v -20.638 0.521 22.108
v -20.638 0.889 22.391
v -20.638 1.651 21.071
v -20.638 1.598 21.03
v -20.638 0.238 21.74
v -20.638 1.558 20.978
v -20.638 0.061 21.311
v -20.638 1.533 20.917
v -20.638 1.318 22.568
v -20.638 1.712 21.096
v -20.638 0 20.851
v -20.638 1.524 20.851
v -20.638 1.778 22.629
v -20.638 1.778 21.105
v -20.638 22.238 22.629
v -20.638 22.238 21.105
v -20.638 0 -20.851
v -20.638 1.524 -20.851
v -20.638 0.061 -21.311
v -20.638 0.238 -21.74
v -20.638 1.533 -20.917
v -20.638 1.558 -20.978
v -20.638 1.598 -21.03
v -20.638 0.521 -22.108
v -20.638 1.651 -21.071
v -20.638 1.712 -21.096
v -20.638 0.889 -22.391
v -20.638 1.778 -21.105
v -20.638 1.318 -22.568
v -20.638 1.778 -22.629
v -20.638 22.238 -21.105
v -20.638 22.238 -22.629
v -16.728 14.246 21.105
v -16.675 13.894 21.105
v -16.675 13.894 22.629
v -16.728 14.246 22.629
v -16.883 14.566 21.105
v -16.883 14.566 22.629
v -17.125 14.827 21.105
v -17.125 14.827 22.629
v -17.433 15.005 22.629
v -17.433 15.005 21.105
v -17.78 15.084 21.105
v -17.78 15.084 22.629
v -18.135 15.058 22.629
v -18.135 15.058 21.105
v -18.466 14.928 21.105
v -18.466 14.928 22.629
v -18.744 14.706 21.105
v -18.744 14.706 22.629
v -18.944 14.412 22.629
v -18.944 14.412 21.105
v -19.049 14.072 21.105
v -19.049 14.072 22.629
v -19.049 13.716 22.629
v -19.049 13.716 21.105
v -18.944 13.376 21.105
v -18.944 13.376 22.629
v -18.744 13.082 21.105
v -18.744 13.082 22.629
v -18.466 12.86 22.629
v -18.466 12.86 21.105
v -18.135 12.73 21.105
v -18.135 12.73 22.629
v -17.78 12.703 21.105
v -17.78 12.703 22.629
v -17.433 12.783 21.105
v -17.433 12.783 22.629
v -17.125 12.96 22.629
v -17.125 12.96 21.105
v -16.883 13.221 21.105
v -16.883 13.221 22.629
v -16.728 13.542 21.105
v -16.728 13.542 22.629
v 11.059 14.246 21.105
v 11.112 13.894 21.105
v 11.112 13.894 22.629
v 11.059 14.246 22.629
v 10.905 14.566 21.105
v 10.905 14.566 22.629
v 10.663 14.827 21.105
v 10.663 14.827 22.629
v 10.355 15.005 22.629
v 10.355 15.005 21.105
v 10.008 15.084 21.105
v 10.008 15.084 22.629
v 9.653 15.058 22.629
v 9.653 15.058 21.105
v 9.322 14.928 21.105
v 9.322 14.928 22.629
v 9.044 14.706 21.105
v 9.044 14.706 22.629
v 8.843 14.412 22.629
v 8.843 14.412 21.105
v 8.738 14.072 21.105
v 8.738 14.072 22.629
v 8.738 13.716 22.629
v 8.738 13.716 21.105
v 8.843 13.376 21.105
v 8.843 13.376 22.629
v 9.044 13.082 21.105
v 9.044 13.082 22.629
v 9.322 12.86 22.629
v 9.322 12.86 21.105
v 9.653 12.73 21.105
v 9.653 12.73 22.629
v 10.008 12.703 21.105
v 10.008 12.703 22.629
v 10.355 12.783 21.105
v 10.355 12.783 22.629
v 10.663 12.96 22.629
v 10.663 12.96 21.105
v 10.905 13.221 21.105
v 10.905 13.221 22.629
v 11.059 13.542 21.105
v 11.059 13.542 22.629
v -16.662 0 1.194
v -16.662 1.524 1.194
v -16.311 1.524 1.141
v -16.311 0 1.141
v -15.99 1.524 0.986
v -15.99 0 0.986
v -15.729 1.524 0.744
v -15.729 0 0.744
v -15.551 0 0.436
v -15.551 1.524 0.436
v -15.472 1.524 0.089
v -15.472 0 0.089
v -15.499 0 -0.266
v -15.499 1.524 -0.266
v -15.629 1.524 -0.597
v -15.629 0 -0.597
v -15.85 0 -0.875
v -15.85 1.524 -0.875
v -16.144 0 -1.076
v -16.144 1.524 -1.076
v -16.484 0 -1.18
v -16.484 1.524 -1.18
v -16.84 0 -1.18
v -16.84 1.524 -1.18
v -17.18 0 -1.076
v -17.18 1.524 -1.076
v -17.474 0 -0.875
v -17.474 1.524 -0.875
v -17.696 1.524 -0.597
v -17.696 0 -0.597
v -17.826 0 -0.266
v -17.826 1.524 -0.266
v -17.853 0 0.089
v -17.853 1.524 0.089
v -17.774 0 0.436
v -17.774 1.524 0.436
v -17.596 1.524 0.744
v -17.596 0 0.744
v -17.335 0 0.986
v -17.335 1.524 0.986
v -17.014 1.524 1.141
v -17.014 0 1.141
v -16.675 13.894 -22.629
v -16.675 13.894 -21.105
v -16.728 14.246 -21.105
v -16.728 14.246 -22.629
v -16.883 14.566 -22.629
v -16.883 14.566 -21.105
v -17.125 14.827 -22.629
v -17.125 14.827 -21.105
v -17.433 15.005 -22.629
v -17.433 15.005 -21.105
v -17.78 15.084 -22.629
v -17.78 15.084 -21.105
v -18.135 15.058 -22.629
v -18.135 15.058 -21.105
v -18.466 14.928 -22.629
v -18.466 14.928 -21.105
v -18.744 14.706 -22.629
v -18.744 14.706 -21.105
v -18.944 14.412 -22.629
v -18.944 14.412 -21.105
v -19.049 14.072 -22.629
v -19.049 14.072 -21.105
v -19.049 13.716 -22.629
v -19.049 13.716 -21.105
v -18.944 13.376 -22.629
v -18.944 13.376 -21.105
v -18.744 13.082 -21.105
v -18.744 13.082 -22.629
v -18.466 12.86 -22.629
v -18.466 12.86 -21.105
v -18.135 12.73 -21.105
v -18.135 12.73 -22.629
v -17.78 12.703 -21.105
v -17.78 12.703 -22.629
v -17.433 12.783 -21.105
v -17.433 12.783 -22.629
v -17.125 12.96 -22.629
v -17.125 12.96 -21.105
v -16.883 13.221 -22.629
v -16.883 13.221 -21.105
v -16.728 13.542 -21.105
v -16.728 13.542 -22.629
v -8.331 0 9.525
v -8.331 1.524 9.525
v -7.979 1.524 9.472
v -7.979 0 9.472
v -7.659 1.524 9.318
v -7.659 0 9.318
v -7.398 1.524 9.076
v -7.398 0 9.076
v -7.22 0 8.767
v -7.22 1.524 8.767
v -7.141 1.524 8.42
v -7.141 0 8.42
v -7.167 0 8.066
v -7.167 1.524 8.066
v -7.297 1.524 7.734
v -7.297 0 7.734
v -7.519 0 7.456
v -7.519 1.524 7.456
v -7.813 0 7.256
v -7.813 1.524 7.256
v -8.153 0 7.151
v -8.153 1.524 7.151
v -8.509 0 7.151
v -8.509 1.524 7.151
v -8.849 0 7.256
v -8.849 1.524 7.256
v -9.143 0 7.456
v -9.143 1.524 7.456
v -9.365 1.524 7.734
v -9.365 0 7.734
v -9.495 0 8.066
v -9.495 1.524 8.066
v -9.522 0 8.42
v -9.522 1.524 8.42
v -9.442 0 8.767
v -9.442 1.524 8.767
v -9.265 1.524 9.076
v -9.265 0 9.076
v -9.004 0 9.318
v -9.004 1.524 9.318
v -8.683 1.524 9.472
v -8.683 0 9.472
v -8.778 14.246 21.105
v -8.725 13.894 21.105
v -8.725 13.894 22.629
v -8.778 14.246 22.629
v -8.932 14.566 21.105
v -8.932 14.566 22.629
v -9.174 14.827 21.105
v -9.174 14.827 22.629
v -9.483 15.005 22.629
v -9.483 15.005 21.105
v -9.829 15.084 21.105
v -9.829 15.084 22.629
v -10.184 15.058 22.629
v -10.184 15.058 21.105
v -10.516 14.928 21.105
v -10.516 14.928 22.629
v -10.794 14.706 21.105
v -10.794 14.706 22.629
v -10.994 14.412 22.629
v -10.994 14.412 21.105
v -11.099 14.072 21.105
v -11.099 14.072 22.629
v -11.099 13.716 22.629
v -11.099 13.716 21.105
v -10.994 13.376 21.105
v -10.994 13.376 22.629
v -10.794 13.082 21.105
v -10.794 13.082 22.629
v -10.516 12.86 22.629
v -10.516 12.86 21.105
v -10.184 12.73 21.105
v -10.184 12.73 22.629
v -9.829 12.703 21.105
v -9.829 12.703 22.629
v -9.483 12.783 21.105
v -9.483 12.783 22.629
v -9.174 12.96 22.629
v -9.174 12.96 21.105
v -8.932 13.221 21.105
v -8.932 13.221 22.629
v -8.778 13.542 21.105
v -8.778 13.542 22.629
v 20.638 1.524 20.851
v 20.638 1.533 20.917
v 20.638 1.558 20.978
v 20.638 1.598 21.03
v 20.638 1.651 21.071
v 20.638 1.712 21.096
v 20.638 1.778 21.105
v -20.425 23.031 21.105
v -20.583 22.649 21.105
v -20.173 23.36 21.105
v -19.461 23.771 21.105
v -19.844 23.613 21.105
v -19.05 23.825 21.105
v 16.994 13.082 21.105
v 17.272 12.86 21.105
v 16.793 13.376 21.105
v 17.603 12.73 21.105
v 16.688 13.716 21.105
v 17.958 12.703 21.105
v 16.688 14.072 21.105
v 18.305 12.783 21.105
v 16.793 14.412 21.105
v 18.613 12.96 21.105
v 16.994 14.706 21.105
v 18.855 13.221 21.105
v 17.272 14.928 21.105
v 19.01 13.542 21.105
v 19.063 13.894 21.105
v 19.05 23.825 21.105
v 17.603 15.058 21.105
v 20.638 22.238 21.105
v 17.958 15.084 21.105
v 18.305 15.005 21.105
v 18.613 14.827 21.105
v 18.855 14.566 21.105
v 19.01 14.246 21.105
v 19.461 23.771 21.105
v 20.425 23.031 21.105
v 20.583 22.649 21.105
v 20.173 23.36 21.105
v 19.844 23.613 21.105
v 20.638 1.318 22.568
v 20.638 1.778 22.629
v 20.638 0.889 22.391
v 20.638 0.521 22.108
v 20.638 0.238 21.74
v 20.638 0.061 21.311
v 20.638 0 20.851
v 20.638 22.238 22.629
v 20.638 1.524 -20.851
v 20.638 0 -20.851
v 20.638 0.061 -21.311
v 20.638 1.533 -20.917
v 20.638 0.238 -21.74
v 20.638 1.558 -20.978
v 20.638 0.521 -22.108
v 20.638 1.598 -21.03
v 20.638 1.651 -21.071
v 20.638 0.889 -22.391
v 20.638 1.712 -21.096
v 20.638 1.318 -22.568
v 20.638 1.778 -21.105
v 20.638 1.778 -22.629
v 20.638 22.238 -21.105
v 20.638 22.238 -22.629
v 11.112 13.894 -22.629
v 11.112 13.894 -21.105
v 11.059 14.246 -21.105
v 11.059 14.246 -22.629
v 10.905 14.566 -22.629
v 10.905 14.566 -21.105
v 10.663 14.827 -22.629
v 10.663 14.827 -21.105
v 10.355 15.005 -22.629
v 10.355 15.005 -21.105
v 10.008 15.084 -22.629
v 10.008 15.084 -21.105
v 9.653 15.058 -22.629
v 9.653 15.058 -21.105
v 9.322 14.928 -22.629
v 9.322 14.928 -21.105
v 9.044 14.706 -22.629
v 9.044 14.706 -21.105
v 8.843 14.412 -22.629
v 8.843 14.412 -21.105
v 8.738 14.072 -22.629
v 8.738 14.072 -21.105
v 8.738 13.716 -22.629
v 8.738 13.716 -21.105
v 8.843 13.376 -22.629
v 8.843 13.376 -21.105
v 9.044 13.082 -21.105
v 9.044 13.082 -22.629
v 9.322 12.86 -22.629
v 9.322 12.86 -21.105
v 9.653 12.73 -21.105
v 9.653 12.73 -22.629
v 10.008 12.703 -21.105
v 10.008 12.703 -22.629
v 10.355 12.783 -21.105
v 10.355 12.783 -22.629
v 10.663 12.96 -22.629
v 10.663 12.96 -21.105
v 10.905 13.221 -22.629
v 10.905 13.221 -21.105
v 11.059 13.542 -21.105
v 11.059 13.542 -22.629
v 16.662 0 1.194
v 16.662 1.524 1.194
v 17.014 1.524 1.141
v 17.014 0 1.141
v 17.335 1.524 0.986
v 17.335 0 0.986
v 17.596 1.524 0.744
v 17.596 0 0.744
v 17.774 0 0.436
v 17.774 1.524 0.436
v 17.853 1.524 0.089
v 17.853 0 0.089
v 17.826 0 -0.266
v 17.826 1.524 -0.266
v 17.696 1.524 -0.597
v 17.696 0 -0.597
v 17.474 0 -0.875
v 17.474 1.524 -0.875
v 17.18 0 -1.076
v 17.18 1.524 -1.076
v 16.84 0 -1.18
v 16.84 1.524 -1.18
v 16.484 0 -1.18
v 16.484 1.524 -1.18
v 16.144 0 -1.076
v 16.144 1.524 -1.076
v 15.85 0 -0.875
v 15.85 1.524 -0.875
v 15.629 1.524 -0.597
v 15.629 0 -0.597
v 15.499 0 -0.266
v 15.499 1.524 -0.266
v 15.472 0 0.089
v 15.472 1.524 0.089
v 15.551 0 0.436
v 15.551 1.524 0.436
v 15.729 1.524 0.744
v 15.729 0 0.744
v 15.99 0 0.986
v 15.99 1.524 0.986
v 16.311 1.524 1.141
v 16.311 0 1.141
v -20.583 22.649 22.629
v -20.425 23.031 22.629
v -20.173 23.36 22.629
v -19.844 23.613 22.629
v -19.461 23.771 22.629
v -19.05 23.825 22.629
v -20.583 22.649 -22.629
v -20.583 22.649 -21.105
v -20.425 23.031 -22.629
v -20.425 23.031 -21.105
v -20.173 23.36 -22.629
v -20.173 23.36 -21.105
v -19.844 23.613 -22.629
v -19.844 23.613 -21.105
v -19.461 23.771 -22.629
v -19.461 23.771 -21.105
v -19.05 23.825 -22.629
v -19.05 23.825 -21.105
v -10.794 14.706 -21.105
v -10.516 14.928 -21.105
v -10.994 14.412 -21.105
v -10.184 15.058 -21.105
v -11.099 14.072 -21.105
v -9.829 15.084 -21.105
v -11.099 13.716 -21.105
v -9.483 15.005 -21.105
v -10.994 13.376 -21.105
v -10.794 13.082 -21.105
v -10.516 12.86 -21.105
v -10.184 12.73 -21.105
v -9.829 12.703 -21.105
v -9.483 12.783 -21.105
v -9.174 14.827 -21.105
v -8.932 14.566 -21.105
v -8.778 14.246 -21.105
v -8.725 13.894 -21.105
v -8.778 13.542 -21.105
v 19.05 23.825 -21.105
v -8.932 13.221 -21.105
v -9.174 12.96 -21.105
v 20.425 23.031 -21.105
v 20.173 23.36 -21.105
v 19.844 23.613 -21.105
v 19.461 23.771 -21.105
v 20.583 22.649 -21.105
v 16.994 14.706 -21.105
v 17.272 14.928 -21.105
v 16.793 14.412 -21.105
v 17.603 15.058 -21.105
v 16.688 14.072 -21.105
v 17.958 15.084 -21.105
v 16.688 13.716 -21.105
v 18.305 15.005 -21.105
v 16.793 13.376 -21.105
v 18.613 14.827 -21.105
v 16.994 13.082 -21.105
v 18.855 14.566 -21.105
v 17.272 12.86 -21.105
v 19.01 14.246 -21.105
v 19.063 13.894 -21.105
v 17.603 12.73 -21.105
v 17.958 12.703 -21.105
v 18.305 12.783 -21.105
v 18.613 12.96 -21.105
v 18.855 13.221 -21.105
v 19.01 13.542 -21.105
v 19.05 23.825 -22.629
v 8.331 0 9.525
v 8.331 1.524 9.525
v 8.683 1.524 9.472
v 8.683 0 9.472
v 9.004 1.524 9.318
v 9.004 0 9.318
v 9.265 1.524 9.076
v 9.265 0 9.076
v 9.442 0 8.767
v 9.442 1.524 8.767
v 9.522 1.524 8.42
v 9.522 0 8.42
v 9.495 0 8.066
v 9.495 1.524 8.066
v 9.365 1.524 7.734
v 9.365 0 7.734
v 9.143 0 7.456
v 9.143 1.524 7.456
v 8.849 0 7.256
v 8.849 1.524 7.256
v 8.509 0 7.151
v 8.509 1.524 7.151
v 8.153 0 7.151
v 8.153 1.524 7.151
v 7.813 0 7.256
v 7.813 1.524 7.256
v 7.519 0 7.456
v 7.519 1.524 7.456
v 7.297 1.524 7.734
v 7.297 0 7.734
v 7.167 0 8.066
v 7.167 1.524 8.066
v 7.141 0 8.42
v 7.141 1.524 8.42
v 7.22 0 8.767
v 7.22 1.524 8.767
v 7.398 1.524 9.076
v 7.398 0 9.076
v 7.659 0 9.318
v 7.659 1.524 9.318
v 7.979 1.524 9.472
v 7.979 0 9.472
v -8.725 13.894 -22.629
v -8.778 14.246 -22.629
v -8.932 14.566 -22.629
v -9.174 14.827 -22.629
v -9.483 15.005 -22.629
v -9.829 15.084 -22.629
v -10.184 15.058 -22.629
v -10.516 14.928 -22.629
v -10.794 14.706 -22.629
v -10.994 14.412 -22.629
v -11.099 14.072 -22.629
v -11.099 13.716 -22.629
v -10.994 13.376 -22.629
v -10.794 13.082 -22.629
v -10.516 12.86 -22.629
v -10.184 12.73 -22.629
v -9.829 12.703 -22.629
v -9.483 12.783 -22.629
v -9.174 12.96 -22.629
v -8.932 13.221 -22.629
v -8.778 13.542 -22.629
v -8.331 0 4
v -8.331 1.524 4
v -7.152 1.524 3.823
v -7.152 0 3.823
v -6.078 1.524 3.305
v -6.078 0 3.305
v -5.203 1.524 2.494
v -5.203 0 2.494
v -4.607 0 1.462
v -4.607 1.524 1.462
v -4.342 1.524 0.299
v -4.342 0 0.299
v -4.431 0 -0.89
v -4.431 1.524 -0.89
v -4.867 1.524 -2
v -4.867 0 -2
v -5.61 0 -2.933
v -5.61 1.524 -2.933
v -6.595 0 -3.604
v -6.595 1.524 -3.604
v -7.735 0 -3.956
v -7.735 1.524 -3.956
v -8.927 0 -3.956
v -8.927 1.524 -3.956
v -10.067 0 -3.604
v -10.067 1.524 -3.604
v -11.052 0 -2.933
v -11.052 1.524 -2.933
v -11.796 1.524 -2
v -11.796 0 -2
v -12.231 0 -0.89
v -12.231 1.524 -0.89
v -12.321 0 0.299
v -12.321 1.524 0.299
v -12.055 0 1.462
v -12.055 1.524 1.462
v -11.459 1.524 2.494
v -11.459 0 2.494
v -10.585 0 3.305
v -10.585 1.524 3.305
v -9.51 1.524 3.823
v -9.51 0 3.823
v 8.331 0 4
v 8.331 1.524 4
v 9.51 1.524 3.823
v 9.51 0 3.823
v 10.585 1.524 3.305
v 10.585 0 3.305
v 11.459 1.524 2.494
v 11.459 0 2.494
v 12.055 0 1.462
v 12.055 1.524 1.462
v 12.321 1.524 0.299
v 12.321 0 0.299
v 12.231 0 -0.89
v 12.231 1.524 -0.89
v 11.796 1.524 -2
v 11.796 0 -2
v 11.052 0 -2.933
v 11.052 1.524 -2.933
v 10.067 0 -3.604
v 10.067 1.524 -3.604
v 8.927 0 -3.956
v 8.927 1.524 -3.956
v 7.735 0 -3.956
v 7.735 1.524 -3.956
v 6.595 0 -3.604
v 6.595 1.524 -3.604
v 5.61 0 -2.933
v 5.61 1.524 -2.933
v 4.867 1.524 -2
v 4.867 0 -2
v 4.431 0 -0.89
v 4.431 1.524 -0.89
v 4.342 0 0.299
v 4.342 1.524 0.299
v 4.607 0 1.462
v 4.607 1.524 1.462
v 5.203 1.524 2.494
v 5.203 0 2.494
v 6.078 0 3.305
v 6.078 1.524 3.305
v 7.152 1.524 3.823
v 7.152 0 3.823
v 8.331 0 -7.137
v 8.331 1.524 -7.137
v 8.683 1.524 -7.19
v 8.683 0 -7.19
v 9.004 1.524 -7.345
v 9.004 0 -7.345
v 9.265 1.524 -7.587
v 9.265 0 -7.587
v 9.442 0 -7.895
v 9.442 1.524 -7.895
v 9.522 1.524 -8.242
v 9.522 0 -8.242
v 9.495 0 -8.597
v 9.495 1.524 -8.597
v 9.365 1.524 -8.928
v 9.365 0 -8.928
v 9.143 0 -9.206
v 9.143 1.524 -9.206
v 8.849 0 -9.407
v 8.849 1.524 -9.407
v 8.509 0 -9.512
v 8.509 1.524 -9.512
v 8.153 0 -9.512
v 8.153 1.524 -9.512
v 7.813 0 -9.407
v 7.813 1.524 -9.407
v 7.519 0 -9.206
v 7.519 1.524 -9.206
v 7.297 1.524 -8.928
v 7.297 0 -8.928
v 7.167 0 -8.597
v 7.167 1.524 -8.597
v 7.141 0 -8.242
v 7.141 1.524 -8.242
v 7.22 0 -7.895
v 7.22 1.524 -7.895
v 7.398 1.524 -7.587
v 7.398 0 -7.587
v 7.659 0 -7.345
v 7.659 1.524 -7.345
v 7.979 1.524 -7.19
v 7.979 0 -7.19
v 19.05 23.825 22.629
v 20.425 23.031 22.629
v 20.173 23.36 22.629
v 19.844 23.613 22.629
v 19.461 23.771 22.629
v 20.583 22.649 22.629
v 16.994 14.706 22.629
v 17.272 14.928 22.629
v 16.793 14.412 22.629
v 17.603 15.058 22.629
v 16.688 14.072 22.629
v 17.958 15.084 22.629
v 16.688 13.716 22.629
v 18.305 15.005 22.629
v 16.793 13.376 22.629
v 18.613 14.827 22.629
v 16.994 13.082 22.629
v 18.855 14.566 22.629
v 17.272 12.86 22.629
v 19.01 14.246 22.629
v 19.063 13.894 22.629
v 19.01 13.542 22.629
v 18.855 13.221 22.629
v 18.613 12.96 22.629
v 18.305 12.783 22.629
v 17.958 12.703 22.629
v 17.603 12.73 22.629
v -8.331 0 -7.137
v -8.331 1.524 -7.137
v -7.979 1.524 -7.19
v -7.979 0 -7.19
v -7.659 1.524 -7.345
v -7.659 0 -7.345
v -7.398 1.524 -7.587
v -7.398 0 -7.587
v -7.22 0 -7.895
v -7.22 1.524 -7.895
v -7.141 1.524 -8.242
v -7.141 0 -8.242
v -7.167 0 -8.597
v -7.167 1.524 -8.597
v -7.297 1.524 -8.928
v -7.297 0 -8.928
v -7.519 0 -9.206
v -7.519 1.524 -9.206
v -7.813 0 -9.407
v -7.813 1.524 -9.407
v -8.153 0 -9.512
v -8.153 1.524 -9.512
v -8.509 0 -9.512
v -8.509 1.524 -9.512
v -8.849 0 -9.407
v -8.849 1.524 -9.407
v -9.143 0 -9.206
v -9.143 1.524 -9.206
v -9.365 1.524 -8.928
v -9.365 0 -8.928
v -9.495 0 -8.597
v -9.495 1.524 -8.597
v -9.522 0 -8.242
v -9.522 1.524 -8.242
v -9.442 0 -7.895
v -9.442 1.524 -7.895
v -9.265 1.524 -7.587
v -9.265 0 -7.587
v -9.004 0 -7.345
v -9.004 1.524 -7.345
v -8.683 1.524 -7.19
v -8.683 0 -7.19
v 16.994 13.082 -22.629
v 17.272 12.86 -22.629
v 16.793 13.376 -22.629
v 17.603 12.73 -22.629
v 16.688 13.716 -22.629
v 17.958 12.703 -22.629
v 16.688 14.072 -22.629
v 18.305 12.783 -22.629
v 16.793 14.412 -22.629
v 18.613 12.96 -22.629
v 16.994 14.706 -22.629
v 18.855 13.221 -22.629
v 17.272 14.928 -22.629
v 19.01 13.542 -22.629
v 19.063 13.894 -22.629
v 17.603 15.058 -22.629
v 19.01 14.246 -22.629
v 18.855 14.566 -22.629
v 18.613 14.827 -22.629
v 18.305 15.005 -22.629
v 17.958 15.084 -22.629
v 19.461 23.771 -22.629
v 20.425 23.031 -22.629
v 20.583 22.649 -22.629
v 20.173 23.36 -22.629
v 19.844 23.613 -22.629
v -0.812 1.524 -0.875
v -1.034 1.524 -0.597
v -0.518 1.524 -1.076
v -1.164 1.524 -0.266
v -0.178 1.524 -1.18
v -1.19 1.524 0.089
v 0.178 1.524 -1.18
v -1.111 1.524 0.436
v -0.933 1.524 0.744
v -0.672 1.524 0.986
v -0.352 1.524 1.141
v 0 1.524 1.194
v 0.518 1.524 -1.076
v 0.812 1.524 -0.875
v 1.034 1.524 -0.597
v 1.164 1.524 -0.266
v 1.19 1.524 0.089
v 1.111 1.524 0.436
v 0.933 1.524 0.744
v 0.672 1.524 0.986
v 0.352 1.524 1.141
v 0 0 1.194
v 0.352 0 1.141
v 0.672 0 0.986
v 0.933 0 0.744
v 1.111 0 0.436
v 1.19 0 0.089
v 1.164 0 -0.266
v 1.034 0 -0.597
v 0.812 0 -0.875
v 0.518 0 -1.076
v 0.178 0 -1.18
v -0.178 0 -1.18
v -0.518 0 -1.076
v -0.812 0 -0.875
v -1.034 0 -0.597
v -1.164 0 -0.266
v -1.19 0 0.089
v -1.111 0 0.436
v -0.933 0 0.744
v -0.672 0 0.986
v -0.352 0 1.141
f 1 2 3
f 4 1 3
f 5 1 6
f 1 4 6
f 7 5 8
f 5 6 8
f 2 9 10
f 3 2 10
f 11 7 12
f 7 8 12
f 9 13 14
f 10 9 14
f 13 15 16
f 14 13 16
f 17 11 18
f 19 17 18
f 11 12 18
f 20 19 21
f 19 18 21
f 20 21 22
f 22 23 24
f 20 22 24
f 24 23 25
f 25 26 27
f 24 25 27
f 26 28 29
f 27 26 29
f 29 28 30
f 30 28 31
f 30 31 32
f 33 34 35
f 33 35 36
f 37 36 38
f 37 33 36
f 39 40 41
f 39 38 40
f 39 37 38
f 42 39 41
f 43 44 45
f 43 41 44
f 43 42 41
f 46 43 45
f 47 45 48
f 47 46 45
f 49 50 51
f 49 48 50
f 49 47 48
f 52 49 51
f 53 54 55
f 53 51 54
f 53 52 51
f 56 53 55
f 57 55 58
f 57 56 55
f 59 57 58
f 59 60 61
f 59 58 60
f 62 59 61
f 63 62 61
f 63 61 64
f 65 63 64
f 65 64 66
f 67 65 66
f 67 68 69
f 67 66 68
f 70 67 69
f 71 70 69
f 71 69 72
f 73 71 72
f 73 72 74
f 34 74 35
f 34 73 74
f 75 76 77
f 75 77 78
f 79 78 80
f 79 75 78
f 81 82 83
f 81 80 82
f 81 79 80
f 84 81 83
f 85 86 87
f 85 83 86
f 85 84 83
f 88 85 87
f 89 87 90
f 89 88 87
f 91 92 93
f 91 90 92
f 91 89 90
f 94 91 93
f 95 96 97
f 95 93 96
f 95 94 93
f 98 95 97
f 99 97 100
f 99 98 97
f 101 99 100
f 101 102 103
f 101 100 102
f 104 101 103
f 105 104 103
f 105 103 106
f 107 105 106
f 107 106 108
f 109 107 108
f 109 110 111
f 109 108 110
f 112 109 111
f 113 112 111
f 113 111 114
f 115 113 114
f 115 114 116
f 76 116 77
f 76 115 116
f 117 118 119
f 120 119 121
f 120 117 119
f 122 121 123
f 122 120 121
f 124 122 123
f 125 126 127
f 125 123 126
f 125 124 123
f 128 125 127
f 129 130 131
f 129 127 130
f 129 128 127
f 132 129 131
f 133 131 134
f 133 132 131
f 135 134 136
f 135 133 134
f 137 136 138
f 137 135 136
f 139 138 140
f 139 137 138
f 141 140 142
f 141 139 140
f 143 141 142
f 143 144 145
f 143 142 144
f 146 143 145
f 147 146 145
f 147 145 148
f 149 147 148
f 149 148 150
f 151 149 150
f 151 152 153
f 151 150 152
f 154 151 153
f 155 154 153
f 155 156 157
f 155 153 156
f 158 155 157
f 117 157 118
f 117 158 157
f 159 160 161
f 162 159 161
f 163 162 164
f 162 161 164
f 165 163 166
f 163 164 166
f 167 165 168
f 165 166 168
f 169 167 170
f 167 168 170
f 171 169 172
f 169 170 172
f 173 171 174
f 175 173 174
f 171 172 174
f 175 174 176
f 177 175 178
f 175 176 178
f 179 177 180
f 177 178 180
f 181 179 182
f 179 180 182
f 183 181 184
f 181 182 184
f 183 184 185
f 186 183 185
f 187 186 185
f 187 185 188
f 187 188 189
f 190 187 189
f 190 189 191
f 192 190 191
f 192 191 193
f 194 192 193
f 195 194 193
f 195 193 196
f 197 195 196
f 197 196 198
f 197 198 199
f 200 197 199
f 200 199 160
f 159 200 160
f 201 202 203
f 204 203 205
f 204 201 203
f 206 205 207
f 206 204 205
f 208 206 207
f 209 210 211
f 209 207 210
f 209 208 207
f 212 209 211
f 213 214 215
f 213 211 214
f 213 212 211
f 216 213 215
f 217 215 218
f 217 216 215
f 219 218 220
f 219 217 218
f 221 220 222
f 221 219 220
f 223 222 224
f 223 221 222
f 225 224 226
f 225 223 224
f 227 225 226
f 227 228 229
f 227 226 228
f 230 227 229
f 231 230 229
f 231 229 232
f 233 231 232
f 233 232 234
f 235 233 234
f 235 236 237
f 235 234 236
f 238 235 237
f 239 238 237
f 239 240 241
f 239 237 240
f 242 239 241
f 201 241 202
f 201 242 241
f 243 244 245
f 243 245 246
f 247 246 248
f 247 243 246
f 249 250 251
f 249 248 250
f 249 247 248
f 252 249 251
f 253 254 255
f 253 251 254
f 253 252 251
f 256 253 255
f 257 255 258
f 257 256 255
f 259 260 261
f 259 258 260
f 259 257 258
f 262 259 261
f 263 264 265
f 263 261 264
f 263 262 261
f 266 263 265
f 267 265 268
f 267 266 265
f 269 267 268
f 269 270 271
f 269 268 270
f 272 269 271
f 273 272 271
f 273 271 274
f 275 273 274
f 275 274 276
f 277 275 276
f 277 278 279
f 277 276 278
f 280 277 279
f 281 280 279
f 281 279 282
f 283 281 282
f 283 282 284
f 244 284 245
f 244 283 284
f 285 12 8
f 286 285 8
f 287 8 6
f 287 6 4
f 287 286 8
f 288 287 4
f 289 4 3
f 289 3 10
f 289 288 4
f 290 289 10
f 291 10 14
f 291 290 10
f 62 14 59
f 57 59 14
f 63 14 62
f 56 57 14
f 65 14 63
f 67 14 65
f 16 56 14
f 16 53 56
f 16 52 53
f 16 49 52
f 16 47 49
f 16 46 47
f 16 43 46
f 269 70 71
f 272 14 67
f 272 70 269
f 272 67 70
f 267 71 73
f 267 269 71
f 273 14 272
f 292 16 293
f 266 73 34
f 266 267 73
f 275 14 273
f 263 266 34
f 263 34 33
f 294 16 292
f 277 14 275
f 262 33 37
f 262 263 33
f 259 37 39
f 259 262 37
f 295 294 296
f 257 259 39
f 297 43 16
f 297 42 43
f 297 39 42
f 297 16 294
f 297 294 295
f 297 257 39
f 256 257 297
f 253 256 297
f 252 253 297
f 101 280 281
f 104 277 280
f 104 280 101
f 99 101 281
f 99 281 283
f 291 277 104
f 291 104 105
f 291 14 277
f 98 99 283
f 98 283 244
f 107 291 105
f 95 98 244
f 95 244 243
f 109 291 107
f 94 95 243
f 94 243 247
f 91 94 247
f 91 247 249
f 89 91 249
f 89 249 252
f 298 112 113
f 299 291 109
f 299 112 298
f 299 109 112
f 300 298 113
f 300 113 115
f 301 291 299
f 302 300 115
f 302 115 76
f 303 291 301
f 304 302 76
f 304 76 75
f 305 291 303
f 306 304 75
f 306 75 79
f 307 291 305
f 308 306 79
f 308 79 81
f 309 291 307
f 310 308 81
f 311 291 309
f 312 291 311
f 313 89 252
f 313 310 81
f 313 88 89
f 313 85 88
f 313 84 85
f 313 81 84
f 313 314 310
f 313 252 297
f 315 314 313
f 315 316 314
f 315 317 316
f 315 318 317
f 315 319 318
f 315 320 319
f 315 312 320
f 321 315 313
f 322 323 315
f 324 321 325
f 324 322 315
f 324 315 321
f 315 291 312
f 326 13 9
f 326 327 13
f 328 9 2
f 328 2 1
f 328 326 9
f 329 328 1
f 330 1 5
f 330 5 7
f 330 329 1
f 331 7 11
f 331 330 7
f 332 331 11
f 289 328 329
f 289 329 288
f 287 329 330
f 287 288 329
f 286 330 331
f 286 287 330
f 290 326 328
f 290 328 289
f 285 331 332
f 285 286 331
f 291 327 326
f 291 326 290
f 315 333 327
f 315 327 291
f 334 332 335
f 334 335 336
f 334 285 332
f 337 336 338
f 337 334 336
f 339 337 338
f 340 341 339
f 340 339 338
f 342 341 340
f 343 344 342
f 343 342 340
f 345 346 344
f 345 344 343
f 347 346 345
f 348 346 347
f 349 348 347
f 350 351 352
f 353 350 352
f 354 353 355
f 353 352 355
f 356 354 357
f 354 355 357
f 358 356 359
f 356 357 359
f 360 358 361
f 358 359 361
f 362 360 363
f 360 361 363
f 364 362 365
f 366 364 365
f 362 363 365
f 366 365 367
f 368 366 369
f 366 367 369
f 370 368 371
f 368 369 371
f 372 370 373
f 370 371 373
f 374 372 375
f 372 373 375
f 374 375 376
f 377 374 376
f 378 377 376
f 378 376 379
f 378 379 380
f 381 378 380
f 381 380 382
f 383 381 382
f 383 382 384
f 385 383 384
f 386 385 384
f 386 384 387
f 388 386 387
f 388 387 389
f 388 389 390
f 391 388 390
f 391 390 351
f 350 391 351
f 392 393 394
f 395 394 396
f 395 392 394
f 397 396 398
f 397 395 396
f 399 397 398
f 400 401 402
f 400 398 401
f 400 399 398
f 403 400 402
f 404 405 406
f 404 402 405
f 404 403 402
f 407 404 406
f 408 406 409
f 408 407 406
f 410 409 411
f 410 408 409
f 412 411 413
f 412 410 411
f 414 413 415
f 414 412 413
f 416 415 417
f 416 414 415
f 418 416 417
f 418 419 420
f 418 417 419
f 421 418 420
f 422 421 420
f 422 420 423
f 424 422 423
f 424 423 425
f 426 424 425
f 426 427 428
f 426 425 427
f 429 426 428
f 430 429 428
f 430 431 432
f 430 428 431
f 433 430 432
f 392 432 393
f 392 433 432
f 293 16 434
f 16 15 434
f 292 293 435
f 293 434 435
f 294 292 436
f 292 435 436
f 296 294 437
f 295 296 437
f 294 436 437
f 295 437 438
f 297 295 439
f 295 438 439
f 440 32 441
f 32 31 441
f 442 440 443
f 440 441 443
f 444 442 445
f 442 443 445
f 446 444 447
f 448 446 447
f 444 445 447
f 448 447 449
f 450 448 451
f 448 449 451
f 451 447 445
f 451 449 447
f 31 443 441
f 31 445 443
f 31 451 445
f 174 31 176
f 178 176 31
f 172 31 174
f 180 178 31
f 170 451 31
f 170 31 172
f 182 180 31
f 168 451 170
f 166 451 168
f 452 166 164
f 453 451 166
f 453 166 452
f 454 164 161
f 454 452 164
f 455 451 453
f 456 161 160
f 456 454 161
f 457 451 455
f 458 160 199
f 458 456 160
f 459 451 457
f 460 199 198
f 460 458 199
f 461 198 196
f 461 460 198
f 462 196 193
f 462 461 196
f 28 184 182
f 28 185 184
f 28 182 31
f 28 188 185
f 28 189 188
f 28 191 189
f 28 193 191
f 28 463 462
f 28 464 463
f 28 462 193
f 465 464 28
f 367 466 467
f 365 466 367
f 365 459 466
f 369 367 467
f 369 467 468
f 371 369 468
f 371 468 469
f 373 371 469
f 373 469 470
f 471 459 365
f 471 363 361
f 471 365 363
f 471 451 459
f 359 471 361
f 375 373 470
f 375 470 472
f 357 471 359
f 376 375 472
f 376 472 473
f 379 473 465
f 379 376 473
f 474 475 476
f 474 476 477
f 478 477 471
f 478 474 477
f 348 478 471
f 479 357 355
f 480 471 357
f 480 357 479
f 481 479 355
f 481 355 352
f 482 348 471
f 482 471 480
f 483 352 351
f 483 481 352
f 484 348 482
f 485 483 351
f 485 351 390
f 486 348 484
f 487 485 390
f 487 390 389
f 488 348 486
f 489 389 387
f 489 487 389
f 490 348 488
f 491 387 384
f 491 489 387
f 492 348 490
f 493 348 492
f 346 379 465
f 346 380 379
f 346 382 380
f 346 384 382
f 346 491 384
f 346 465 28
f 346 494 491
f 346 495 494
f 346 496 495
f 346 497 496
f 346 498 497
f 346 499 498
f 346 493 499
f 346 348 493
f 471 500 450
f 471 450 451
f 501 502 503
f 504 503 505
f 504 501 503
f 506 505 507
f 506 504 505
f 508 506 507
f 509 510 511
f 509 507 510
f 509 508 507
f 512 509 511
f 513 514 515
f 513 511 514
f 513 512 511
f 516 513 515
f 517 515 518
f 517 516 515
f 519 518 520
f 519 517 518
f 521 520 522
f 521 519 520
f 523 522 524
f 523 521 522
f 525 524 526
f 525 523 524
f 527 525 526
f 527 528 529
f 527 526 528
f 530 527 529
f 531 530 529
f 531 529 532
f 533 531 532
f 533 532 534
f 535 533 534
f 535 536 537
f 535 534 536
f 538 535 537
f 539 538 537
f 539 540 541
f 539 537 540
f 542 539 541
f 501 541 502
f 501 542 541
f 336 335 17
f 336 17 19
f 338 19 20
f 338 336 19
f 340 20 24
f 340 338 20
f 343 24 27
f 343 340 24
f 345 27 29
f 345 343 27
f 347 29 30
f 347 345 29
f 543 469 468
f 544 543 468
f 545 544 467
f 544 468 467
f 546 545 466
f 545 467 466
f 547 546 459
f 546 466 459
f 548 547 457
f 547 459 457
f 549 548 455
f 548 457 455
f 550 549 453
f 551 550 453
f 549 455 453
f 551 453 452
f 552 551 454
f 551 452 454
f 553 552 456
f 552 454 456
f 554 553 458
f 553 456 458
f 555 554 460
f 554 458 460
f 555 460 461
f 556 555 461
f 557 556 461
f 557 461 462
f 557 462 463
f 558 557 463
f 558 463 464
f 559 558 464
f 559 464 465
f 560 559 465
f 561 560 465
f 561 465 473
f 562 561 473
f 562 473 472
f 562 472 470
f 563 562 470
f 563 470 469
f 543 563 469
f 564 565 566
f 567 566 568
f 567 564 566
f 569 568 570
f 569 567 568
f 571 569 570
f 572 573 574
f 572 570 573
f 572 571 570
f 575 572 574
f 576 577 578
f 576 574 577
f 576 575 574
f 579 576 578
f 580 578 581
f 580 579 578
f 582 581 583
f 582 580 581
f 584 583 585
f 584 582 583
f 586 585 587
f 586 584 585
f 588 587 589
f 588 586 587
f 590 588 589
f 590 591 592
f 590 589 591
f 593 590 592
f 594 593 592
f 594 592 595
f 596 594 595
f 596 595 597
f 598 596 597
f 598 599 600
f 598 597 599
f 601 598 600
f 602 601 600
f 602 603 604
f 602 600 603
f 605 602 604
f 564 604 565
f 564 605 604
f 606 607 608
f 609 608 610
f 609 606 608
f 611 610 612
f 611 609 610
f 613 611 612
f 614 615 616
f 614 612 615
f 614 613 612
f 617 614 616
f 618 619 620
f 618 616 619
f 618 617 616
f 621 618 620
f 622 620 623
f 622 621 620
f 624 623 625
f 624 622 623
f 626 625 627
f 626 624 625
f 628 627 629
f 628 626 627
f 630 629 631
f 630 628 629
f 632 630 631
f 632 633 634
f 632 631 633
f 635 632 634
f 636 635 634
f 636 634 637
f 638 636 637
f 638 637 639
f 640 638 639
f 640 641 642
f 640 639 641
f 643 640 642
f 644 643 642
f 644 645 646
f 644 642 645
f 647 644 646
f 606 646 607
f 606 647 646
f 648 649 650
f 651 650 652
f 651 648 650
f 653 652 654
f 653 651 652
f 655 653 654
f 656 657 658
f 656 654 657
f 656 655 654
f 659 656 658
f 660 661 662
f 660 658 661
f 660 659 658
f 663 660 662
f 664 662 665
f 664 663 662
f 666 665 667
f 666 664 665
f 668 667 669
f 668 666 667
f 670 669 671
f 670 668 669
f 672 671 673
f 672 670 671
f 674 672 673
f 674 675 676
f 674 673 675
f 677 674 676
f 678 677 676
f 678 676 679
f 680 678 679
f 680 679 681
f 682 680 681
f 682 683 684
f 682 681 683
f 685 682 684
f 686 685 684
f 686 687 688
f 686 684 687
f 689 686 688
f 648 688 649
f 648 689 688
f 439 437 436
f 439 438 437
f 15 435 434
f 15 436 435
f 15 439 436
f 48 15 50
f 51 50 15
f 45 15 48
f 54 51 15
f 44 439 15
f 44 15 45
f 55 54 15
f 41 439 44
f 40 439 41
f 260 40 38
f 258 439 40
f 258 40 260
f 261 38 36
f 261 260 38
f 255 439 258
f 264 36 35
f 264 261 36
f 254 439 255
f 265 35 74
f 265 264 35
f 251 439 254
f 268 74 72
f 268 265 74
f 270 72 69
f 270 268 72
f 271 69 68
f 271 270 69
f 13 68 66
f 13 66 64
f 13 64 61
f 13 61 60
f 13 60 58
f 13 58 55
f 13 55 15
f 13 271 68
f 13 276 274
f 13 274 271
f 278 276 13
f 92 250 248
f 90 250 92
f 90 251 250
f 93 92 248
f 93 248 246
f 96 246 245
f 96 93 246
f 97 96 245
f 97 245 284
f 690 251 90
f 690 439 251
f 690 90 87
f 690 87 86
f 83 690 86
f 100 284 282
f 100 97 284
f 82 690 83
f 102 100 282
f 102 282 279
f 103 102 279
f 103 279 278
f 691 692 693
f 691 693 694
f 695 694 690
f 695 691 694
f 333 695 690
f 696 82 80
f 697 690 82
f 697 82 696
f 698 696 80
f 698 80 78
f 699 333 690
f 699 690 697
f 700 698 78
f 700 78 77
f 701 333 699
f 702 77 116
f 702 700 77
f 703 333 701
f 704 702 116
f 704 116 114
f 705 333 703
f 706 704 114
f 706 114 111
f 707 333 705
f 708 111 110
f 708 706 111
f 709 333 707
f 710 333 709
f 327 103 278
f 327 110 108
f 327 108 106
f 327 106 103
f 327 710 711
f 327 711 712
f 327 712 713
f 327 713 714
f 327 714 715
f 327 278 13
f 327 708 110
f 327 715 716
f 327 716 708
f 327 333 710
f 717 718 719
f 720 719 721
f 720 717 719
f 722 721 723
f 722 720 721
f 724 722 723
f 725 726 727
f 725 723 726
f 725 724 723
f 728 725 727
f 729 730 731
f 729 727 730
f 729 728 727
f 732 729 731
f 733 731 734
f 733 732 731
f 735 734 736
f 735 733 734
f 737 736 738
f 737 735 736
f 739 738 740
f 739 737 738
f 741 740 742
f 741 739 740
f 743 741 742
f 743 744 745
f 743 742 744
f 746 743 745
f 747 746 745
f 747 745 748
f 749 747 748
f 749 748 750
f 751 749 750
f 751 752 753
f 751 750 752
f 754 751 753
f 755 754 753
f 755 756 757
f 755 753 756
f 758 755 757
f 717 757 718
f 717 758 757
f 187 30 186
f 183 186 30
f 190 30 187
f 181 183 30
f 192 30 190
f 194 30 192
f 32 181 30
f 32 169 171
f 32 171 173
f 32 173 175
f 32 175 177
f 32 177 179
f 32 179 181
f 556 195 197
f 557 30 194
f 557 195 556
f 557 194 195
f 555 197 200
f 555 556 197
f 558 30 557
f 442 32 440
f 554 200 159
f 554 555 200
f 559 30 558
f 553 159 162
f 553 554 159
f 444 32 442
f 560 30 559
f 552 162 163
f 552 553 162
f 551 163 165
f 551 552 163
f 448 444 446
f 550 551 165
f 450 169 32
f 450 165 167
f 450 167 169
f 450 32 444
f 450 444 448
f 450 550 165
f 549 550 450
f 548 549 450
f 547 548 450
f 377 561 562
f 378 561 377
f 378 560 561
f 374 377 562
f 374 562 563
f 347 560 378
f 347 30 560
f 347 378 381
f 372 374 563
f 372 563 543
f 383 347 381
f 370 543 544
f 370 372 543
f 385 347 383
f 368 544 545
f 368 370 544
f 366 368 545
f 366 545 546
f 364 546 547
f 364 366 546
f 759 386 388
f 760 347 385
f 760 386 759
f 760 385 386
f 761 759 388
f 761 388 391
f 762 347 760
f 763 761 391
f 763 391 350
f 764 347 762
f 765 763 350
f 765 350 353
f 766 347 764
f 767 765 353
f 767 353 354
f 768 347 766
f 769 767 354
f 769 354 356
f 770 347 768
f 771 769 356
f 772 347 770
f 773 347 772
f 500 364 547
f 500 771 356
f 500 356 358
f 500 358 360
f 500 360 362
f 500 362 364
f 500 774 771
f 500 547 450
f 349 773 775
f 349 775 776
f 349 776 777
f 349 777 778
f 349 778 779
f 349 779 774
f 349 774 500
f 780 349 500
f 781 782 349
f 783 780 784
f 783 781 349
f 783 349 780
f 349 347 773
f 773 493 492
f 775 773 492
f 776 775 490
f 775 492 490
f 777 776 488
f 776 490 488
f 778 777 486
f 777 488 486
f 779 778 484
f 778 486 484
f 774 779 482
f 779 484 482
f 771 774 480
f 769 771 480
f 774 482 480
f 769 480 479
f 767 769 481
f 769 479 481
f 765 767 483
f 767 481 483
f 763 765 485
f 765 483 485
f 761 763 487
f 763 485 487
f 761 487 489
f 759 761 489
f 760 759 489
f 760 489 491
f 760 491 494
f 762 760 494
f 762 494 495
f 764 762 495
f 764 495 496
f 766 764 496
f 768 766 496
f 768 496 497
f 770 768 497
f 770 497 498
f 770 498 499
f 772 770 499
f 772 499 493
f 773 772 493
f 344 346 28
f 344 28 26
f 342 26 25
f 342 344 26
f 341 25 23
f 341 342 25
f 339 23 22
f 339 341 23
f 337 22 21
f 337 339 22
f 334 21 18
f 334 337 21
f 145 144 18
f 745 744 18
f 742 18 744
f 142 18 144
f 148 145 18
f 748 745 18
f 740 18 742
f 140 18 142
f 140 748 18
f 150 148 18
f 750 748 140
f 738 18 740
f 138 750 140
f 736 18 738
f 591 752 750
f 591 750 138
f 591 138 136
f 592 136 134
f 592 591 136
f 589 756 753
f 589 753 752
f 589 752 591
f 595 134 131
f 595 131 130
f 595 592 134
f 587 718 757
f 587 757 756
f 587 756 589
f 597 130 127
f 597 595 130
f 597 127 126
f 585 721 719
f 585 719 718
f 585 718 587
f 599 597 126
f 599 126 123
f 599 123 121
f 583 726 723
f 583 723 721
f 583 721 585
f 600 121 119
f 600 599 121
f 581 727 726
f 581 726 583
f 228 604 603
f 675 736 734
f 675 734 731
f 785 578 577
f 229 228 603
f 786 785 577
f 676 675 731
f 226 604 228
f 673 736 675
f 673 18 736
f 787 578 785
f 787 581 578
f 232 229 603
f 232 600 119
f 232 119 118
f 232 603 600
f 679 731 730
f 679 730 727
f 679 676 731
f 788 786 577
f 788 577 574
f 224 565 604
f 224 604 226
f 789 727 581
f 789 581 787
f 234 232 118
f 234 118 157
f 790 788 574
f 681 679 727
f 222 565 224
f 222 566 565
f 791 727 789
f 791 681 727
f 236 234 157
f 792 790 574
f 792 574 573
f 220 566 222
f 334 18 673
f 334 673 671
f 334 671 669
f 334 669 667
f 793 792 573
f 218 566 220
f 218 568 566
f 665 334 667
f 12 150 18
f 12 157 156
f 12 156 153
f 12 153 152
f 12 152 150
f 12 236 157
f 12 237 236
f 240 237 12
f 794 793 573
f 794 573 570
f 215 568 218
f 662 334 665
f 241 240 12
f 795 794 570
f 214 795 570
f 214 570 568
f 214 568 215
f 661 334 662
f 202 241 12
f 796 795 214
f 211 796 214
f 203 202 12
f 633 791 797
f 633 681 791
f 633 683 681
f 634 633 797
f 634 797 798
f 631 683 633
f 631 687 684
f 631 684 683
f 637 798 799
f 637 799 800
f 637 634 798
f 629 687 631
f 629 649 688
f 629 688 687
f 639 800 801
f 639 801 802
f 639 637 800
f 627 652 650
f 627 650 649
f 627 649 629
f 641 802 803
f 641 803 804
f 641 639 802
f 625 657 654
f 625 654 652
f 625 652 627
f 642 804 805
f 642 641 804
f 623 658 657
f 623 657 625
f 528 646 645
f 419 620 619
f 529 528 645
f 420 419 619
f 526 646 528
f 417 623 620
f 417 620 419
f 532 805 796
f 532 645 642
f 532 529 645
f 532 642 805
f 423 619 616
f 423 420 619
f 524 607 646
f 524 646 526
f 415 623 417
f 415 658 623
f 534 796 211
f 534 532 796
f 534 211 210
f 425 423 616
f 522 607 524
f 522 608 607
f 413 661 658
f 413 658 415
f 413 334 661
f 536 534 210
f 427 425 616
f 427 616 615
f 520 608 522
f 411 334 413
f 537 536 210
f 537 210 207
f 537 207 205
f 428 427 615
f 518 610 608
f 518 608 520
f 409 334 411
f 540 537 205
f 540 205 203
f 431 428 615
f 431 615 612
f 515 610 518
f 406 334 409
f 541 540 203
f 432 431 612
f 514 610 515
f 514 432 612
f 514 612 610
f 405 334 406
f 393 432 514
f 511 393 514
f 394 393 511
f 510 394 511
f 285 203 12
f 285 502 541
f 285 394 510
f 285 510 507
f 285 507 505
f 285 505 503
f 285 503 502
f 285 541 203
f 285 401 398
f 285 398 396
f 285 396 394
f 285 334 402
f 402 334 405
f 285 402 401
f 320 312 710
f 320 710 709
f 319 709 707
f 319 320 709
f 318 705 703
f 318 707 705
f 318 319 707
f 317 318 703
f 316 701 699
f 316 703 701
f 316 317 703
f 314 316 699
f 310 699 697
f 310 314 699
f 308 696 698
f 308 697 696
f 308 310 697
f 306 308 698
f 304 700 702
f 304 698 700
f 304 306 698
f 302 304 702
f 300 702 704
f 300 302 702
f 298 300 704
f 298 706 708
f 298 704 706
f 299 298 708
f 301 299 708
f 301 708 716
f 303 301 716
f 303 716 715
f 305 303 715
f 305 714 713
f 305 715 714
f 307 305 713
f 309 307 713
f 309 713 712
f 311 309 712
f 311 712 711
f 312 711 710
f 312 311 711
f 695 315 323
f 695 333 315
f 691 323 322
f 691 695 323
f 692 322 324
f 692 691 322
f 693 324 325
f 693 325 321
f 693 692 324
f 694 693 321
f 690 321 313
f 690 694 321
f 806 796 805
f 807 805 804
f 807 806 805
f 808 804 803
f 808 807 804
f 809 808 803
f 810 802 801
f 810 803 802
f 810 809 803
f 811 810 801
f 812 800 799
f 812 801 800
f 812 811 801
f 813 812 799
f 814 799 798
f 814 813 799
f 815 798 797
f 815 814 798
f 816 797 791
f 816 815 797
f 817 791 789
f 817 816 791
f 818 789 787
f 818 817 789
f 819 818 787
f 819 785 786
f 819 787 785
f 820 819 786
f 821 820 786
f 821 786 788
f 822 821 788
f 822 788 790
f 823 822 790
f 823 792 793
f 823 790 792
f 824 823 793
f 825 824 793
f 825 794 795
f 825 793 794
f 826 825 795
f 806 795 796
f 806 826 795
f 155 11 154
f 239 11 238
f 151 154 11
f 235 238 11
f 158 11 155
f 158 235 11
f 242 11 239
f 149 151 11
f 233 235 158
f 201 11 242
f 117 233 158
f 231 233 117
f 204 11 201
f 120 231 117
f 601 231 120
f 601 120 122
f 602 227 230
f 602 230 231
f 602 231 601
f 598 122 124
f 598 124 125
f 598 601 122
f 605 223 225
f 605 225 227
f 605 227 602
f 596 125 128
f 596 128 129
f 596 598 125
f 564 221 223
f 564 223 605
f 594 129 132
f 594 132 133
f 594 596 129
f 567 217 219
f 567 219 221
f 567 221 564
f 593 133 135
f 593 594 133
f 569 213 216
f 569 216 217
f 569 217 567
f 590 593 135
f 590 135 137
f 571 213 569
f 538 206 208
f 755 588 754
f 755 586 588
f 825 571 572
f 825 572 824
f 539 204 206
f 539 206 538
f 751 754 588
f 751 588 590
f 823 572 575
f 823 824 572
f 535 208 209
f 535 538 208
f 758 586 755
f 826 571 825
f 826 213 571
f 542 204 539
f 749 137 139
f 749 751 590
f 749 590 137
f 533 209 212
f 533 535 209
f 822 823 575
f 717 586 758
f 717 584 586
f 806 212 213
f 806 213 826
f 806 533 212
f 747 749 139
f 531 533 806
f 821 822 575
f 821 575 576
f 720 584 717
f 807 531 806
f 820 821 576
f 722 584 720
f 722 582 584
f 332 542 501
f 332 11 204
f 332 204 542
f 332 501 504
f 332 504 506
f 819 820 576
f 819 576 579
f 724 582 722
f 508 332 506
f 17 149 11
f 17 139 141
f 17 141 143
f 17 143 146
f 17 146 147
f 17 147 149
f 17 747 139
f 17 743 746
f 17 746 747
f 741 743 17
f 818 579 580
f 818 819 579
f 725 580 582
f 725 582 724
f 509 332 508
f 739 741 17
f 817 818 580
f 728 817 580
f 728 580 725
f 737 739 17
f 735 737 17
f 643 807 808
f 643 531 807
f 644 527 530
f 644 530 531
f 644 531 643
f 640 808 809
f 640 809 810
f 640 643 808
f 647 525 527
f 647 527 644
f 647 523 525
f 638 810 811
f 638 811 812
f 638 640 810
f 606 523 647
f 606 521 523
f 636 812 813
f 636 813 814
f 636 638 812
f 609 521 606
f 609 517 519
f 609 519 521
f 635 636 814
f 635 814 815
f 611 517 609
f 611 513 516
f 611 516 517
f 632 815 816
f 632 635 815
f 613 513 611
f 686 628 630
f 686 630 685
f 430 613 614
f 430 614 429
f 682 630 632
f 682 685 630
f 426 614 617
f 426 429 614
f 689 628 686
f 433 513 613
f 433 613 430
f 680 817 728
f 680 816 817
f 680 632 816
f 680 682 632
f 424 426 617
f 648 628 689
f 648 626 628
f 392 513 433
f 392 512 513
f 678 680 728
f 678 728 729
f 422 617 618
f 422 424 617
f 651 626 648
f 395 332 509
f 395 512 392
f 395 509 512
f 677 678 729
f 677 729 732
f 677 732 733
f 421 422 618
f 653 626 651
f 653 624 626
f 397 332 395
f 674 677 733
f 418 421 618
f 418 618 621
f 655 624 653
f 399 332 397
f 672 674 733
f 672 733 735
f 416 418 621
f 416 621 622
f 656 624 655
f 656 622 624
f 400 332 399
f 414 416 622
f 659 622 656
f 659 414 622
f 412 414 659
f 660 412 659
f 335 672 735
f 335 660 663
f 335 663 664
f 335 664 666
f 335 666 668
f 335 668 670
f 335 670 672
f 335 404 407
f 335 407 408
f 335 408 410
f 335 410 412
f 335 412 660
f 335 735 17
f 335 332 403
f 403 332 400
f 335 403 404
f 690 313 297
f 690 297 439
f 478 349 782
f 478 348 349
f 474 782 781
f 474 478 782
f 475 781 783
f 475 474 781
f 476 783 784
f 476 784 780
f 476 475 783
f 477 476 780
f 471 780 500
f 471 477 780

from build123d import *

# Parameters (mm, degrees)
EXTRUDE1_DEPTH          = 20.6375
EXTRUDE1_DEPTH_BACK     = 20.6375
SKETCH2_R               = 4.0005
SKETCH2_R_2             = 1.1938
CUT_EXTRUDE1_DEPTH      = 20.6375
CUT_EXTRUDE1_DEPTH_BACK = 20.6375
SKETCH3_R               = 1.1938
CUT_EXTRUDE2_DEPTH      = 23.62886
CUT_EXTRUDE2_DEPTH_BACK = 23.62886
FILLET1_R               = 1.5875


with BuildPart() as part:
    # Sketch1 → Extrude1 (new body, two sides)
    with BuildSketch(Plane(origin=(0, 0, 0), x_dir=(0, 0, -1), z_dir=(1, 0, 0))) as extrude1_sk:
        with BuildLine():
            Line((-20.85086, 0), (20.85086, 0))
            ThreePointArc((20.85086, 0), (22.108095857, 0.520764143), (22.62886, 1.778))
            Line((22.62886, 1.778), (22.62886, 23.8252))
            Line((22.62886, 23.8252), (21.10486, 23.8252))
            Line((21.10486, 23.8252), (21.10486, 1.778))
            ThreePointArc((21.10486, 1.778), (21.030465122, 1.598394878), (20.85086, 1.524))
            Line((20.85086, 1.524), (-20.85086, 1.524))
            ThreePointArc((-20.85086, 1.524), (-21.030465122, 1.598394878), (-21.10486, 1.778))
            Line((-21.10486, 1.778), (-21.10486, 23.8252))
            Line((-21.10486, 23.8252), (-22.62886, 23.8252))
            Line((-22.62886, 23.8252), (-22.62886, 1.778))
            ThreePointArc((-22.62886, 1.778), (-22.108095857, 0.520764143), (-20.85086, 0))
        make_face()
    extrude(amount=EXTRUDE1_DEPTH)
    extrude(extrude1_sk.sketch, amount=-EXTRUDE1_DEPTH_BACK)

    # Sketch2 → Cut-Extrude1 (cut, two sides)
    with BuildSketch(Plane(origin=(0, 0, 0), x_dir=(1, 0, 0), z_dir=(0, 1, 0))) as cut_extrude1_sk:
        with Locations(Location((-8.3312, 0, 0), (0, 0, 270))):  # turned: the seam where the file's is
            Circle(SKETCH2_R)
        with Locations(Location((8.3312, 0, 0), (0, 0, 270))):  # turned: the seam where the file's is
            Circle(SKETCH2_R)
        with Locations(Location((16.6624, 0, 0), (0, 0, 270))):  # turned: the seam where the file's is
            Circle(SKETCH2_R_2)
        with Locations(Location((-16.6624, 0, 0), (0, 0, 270))):  # turned: the seam where the file's is
            Circle(SKETCH2_R_2)
        with Locations(Location((-8.3312, 8.3312, 0), (0, 0, 270))):  # turned: the seam where the file's is
            Circle(SKETCH2_R_2)
        with Locations(Location((8.3312, 8.3312, 0), (0, 0, 270))):  # turned: the seam where the file's is
            Circle(SKETCH2_R_2)
        with Locations(Location((-8.3312, -8.3312, 0), (0, 0, 270))):  # turned: the seam where the file's is
            Circle(SKETCH2_R_2)
        with Locations(Location((8.3312, -8.3312, 0), (0, 0, 270))):  # turned: the seam where the file's is
            Circle(SKETCH2_R_2)
        with Locations(Location((0, 0, 0), (0, 0, 270))):  # turned: the seam where the file's is
            Circle(SKETCH2_R_2)
    extrude(amount=CUT_EXTRUDE1_DEPTH, mode=Mode.SUBTRACT)
    extrude(cut_extrude1_sk.sketch, amount=-CUT_EXTRUDE1_DEPTH_BACK, mode=Mode.SUBTRACT)

    # Sketch3 → Cut-Extrude2 (cut, two sides)
    with BuildSketch(Plane.XY) as cut_extrude2_sk:
        with Locations((-17.8689, 13.8938)):
            Circle(SKETCH3_R)
        with Locations((-9.9187, 13.8938)):
            Circle(SKETCH3_R)
        with Locations((9.9187, 13.8938)):
            Circle(SKETCH3_R)
        with Locations((17.8689, 13.8938)):
            Circle(SKETCH3_R)
    extrude(amount=CUT_EXTRUDE2_DEPTH, mode=Mode.SUBTRACT)
    extrude(cut_extrude2_sk.sketch, amount=-CUT_EXTRUDE2_DEPTH_BACK, mode=Mode.SUBTRACT)

    # Fillet1
    fillet1_edges = [part.edges().sort_by_distance(p)[0] for p in [
        (20.6375, 23.8252, -21.86686),
        (-20.6375, 23.8252, 21.86686),
        (-20.6375, 23.8252, -21.86686),
        (20.6375, 23.8252, 21.86686),
    ]]
    fillet(fillet1_edges, radius=FILLET1_R)


solid = part.part
